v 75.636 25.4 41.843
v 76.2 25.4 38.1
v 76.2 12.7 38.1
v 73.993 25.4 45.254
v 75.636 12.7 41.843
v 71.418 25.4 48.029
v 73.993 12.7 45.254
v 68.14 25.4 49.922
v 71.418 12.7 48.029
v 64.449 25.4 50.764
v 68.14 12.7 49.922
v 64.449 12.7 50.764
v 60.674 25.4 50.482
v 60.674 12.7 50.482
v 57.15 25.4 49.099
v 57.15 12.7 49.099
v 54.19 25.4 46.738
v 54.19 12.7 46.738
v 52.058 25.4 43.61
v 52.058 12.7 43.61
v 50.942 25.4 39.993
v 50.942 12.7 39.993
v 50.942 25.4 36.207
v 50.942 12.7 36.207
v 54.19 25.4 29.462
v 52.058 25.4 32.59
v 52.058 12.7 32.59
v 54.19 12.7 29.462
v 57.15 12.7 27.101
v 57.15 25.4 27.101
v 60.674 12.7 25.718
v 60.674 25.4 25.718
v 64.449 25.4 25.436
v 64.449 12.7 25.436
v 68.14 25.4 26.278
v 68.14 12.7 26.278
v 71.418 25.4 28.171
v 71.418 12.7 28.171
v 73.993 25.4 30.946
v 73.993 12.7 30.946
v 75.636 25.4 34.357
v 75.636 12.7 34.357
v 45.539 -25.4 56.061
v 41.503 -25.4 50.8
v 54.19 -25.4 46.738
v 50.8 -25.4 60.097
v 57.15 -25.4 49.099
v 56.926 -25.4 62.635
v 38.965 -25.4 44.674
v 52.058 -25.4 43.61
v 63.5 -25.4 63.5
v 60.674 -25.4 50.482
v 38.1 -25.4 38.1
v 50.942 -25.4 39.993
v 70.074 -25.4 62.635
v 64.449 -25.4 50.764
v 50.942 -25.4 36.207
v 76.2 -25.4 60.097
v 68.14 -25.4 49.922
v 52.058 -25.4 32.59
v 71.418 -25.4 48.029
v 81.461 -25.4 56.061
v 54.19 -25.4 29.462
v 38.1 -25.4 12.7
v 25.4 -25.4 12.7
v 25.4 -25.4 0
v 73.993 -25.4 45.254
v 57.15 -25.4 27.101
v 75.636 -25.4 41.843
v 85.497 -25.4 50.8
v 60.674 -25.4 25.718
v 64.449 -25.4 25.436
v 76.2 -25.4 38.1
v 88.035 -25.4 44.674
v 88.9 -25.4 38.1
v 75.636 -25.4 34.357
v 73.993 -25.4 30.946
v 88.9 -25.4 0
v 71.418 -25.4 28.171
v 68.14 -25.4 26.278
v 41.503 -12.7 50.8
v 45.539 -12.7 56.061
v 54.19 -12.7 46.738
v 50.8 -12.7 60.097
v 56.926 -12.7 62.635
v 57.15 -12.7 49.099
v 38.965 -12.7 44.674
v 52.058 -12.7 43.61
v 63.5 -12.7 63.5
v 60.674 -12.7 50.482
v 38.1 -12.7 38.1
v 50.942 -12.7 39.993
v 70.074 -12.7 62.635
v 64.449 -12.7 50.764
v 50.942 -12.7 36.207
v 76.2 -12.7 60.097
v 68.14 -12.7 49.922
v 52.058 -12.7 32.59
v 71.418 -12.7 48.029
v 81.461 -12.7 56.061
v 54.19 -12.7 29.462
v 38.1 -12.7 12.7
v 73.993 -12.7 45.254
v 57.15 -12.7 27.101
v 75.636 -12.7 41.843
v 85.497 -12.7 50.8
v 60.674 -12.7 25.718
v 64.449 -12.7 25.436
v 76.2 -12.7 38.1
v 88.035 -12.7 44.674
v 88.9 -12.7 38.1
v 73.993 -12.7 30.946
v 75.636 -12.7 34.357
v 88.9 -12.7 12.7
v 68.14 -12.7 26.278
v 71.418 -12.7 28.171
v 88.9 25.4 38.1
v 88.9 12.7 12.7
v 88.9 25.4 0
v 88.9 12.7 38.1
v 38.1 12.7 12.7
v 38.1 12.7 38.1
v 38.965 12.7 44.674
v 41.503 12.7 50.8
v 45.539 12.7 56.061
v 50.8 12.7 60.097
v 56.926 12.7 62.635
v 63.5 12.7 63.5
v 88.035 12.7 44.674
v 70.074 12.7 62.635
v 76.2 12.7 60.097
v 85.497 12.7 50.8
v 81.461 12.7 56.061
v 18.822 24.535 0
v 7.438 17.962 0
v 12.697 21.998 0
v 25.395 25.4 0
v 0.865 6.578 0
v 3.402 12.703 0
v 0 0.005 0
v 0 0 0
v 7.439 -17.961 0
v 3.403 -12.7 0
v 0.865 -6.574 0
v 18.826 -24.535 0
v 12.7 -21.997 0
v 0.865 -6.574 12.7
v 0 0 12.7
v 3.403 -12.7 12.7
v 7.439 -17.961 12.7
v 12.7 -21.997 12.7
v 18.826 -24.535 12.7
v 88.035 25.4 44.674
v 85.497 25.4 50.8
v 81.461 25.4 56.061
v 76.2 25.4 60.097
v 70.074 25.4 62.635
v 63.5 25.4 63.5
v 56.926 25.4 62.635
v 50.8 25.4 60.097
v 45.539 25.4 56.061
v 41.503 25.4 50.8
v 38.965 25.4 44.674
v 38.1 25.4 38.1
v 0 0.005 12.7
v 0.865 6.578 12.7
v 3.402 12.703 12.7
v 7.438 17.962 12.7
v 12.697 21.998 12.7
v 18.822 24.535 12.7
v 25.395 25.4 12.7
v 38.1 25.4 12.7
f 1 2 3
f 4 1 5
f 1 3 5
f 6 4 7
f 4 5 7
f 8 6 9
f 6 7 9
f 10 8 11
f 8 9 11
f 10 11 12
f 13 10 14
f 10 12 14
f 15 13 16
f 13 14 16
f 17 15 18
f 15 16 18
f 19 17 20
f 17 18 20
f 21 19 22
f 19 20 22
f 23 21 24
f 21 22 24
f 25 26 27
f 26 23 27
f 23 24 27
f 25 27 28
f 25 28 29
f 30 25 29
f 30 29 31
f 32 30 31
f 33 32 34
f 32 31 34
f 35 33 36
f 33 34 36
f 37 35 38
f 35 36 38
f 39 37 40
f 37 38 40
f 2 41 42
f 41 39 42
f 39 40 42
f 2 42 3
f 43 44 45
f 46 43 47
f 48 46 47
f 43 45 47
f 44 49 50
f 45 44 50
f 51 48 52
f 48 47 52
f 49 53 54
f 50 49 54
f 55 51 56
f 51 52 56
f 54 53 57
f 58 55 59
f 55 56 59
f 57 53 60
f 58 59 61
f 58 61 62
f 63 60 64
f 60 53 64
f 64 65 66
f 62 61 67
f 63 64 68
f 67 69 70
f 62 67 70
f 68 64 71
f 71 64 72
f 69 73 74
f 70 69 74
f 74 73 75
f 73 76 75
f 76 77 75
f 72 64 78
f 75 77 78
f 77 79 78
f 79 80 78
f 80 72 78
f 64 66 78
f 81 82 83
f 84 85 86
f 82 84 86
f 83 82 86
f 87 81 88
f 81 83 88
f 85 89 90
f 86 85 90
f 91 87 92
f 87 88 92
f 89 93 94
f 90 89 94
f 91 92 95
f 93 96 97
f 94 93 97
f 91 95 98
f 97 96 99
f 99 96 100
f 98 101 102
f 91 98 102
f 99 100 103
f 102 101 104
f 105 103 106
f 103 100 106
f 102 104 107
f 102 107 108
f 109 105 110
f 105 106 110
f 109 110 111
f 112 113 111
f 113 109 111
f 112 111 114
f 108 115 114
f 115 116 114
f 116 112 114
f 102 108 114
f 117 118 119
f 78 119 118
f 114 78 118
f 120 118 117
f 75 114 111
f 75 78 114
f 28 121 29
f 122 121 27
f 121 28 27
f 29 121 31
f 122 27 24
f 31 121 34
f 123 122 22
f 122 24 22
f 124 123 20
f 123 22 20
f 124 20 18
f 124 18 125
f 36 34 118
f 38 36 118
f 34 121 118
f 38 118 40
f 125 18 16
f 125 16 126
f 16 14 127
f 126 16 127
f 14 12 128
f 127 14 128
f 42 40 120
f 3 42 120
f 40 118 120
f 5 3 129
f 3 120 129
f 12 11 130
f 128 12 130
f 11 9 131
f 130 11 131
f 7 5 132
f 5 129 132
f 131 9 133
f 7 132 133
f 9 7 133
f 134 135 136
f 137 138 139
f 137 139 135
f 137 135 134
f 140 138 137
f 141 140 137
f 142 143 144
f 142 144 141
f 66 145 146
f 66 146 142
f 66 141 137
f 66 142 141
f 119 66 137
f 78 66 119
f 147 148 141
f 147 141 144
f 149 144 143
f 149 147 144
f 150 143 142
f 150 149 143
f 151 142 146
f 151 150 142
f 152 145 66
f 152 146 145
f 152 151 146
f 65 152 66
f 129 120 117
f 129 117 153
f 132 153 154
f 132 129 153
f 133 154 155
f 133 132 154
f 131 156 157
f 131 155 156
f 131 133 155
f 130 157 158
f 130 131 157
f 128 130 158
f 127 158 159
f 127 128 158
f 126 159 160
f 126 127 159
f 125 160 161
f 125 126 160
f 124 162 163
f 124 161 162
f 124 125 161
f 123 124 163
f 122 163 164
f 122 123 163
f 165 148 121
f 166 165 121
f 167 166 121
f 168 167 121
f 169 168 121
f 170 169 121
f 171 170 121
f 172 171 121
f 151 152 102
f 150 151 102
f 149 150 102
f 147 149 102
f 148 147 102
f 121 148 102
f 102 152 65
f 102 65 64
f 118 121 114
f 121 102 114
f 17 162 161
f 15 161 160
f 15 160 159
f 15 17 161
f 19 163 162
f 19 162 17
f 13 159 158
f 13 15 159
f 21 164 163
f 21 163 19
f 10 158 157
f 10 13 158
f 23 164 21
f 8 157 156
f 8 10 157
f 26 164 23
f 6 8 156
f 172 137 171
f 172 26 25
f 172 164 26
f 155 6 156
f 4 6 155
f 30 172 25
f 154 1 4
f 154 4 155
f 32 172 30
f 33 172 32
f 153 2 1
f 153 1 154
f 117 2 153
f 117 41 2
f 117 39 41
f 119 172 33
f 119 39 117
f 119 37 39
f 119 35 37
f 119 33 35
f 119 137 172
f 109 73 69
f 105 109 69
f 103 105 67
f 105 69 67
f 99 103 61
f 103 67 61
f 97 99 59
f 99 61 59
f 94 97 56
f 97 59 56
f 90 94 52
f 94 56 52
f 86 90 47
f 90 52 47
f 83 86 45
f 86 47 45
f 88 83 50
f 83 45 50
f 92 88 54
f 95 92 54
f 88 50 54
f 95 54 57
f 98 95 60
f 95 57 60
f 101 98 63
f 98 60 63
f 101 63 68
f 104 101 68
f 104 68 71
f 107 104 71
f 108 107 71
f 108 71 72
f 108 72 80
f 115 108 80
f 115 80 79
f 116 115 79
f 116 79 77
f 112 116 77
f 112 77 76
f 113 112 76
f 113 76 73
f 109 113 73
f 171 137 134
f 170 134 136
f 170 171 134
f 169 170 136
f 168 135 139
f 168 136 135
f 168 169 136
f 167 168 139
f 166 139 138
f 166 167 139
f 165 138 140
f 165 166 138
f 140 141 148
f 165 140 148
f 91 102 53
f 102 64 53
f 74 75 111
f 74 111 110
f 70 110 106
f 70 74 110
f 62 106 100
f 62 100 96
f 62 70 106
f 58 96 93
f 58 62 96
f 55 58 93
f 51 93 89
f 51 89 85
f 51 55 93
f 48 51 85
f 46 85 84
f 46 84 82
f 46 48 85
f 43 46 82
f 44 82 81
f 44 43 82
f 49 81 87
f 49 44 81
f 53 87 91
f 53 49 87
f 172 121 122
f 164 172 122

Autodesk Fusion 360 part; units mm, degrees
sketch "Sketch1" plane through (0, 0, 0) normal (0, 1, 0) x (1, 0, 0)
  line L0 (0, 0) -> (0, -12.7)
  line L1 (0, -12.7) -> (38.1, -12.7)
  line L2 (38.1, -12.7) -> (38.1, -38.1)
  line L3 (0, 0) -> (88.9, 0)
  line L4 (88.9, 0) -> (88.9, -38.1)
  arc A0 (38.1, -38.1) -> (88.9, -38.1) centre (63.5, -38.1) ccw
  circle A1 centre (63.5, -38.1) radius 12.7
extrude "Extrude1" add sketch "Sketch1" along normal mid plane 50.8
sketch "Sketch2" plane through (88.9, 0, 0) normal (1, 0, 0) x (0, 1, 0)
  line L0 (-25.4, 0) -> (25.4, 0)
  line L1 (25.4, 0) -> (25.4, 38.1)
  line L2 (25.4, 38.1) -> (-25.4, 38.1)
  line L3 (-25.4, 38.1) -> (-25.4, 0)
  line L4 (-12.7, 67.4271) -> (-12.7, 12.7)
  line L5 (-12.7, 12.7) -> (12.7, 12.7)
  line L6 (12.7, 12.7) -> (12.7, 67.4271)
  line L7 (-12.7, 63.5) -> (12.7, 63.5)
  dimension "d3" = 12.7
  dimension "d4" = 12.7
  dimension "d5" = 12.7
extrude "Extrude2" cut sketch "Sketch2" against normal blind 50.8 contours L2 L4 L6 L7 | L2 L4 L5 L6
sketch "Sketch3" plane through (0, 0, 0) normal (-1, 0, 0) x (0, -1, 0)
  line L0 (25.4, 12.7) -> (-25.4, 12.7)
  line L1 (-25.4, 12.7) -> (-25.4, 0)
  line L2 (-25.4, 0) -> (25.4, 0)
  line L3 (25.4, 0) -> (25.4, 12.7)
fillet "Fillet1" radius 25.4 1 edges at (0, -25.4, 6.35)
fillet "Fillet2" radius 25.4 1 edges at (0, 25.4, 6.35)
